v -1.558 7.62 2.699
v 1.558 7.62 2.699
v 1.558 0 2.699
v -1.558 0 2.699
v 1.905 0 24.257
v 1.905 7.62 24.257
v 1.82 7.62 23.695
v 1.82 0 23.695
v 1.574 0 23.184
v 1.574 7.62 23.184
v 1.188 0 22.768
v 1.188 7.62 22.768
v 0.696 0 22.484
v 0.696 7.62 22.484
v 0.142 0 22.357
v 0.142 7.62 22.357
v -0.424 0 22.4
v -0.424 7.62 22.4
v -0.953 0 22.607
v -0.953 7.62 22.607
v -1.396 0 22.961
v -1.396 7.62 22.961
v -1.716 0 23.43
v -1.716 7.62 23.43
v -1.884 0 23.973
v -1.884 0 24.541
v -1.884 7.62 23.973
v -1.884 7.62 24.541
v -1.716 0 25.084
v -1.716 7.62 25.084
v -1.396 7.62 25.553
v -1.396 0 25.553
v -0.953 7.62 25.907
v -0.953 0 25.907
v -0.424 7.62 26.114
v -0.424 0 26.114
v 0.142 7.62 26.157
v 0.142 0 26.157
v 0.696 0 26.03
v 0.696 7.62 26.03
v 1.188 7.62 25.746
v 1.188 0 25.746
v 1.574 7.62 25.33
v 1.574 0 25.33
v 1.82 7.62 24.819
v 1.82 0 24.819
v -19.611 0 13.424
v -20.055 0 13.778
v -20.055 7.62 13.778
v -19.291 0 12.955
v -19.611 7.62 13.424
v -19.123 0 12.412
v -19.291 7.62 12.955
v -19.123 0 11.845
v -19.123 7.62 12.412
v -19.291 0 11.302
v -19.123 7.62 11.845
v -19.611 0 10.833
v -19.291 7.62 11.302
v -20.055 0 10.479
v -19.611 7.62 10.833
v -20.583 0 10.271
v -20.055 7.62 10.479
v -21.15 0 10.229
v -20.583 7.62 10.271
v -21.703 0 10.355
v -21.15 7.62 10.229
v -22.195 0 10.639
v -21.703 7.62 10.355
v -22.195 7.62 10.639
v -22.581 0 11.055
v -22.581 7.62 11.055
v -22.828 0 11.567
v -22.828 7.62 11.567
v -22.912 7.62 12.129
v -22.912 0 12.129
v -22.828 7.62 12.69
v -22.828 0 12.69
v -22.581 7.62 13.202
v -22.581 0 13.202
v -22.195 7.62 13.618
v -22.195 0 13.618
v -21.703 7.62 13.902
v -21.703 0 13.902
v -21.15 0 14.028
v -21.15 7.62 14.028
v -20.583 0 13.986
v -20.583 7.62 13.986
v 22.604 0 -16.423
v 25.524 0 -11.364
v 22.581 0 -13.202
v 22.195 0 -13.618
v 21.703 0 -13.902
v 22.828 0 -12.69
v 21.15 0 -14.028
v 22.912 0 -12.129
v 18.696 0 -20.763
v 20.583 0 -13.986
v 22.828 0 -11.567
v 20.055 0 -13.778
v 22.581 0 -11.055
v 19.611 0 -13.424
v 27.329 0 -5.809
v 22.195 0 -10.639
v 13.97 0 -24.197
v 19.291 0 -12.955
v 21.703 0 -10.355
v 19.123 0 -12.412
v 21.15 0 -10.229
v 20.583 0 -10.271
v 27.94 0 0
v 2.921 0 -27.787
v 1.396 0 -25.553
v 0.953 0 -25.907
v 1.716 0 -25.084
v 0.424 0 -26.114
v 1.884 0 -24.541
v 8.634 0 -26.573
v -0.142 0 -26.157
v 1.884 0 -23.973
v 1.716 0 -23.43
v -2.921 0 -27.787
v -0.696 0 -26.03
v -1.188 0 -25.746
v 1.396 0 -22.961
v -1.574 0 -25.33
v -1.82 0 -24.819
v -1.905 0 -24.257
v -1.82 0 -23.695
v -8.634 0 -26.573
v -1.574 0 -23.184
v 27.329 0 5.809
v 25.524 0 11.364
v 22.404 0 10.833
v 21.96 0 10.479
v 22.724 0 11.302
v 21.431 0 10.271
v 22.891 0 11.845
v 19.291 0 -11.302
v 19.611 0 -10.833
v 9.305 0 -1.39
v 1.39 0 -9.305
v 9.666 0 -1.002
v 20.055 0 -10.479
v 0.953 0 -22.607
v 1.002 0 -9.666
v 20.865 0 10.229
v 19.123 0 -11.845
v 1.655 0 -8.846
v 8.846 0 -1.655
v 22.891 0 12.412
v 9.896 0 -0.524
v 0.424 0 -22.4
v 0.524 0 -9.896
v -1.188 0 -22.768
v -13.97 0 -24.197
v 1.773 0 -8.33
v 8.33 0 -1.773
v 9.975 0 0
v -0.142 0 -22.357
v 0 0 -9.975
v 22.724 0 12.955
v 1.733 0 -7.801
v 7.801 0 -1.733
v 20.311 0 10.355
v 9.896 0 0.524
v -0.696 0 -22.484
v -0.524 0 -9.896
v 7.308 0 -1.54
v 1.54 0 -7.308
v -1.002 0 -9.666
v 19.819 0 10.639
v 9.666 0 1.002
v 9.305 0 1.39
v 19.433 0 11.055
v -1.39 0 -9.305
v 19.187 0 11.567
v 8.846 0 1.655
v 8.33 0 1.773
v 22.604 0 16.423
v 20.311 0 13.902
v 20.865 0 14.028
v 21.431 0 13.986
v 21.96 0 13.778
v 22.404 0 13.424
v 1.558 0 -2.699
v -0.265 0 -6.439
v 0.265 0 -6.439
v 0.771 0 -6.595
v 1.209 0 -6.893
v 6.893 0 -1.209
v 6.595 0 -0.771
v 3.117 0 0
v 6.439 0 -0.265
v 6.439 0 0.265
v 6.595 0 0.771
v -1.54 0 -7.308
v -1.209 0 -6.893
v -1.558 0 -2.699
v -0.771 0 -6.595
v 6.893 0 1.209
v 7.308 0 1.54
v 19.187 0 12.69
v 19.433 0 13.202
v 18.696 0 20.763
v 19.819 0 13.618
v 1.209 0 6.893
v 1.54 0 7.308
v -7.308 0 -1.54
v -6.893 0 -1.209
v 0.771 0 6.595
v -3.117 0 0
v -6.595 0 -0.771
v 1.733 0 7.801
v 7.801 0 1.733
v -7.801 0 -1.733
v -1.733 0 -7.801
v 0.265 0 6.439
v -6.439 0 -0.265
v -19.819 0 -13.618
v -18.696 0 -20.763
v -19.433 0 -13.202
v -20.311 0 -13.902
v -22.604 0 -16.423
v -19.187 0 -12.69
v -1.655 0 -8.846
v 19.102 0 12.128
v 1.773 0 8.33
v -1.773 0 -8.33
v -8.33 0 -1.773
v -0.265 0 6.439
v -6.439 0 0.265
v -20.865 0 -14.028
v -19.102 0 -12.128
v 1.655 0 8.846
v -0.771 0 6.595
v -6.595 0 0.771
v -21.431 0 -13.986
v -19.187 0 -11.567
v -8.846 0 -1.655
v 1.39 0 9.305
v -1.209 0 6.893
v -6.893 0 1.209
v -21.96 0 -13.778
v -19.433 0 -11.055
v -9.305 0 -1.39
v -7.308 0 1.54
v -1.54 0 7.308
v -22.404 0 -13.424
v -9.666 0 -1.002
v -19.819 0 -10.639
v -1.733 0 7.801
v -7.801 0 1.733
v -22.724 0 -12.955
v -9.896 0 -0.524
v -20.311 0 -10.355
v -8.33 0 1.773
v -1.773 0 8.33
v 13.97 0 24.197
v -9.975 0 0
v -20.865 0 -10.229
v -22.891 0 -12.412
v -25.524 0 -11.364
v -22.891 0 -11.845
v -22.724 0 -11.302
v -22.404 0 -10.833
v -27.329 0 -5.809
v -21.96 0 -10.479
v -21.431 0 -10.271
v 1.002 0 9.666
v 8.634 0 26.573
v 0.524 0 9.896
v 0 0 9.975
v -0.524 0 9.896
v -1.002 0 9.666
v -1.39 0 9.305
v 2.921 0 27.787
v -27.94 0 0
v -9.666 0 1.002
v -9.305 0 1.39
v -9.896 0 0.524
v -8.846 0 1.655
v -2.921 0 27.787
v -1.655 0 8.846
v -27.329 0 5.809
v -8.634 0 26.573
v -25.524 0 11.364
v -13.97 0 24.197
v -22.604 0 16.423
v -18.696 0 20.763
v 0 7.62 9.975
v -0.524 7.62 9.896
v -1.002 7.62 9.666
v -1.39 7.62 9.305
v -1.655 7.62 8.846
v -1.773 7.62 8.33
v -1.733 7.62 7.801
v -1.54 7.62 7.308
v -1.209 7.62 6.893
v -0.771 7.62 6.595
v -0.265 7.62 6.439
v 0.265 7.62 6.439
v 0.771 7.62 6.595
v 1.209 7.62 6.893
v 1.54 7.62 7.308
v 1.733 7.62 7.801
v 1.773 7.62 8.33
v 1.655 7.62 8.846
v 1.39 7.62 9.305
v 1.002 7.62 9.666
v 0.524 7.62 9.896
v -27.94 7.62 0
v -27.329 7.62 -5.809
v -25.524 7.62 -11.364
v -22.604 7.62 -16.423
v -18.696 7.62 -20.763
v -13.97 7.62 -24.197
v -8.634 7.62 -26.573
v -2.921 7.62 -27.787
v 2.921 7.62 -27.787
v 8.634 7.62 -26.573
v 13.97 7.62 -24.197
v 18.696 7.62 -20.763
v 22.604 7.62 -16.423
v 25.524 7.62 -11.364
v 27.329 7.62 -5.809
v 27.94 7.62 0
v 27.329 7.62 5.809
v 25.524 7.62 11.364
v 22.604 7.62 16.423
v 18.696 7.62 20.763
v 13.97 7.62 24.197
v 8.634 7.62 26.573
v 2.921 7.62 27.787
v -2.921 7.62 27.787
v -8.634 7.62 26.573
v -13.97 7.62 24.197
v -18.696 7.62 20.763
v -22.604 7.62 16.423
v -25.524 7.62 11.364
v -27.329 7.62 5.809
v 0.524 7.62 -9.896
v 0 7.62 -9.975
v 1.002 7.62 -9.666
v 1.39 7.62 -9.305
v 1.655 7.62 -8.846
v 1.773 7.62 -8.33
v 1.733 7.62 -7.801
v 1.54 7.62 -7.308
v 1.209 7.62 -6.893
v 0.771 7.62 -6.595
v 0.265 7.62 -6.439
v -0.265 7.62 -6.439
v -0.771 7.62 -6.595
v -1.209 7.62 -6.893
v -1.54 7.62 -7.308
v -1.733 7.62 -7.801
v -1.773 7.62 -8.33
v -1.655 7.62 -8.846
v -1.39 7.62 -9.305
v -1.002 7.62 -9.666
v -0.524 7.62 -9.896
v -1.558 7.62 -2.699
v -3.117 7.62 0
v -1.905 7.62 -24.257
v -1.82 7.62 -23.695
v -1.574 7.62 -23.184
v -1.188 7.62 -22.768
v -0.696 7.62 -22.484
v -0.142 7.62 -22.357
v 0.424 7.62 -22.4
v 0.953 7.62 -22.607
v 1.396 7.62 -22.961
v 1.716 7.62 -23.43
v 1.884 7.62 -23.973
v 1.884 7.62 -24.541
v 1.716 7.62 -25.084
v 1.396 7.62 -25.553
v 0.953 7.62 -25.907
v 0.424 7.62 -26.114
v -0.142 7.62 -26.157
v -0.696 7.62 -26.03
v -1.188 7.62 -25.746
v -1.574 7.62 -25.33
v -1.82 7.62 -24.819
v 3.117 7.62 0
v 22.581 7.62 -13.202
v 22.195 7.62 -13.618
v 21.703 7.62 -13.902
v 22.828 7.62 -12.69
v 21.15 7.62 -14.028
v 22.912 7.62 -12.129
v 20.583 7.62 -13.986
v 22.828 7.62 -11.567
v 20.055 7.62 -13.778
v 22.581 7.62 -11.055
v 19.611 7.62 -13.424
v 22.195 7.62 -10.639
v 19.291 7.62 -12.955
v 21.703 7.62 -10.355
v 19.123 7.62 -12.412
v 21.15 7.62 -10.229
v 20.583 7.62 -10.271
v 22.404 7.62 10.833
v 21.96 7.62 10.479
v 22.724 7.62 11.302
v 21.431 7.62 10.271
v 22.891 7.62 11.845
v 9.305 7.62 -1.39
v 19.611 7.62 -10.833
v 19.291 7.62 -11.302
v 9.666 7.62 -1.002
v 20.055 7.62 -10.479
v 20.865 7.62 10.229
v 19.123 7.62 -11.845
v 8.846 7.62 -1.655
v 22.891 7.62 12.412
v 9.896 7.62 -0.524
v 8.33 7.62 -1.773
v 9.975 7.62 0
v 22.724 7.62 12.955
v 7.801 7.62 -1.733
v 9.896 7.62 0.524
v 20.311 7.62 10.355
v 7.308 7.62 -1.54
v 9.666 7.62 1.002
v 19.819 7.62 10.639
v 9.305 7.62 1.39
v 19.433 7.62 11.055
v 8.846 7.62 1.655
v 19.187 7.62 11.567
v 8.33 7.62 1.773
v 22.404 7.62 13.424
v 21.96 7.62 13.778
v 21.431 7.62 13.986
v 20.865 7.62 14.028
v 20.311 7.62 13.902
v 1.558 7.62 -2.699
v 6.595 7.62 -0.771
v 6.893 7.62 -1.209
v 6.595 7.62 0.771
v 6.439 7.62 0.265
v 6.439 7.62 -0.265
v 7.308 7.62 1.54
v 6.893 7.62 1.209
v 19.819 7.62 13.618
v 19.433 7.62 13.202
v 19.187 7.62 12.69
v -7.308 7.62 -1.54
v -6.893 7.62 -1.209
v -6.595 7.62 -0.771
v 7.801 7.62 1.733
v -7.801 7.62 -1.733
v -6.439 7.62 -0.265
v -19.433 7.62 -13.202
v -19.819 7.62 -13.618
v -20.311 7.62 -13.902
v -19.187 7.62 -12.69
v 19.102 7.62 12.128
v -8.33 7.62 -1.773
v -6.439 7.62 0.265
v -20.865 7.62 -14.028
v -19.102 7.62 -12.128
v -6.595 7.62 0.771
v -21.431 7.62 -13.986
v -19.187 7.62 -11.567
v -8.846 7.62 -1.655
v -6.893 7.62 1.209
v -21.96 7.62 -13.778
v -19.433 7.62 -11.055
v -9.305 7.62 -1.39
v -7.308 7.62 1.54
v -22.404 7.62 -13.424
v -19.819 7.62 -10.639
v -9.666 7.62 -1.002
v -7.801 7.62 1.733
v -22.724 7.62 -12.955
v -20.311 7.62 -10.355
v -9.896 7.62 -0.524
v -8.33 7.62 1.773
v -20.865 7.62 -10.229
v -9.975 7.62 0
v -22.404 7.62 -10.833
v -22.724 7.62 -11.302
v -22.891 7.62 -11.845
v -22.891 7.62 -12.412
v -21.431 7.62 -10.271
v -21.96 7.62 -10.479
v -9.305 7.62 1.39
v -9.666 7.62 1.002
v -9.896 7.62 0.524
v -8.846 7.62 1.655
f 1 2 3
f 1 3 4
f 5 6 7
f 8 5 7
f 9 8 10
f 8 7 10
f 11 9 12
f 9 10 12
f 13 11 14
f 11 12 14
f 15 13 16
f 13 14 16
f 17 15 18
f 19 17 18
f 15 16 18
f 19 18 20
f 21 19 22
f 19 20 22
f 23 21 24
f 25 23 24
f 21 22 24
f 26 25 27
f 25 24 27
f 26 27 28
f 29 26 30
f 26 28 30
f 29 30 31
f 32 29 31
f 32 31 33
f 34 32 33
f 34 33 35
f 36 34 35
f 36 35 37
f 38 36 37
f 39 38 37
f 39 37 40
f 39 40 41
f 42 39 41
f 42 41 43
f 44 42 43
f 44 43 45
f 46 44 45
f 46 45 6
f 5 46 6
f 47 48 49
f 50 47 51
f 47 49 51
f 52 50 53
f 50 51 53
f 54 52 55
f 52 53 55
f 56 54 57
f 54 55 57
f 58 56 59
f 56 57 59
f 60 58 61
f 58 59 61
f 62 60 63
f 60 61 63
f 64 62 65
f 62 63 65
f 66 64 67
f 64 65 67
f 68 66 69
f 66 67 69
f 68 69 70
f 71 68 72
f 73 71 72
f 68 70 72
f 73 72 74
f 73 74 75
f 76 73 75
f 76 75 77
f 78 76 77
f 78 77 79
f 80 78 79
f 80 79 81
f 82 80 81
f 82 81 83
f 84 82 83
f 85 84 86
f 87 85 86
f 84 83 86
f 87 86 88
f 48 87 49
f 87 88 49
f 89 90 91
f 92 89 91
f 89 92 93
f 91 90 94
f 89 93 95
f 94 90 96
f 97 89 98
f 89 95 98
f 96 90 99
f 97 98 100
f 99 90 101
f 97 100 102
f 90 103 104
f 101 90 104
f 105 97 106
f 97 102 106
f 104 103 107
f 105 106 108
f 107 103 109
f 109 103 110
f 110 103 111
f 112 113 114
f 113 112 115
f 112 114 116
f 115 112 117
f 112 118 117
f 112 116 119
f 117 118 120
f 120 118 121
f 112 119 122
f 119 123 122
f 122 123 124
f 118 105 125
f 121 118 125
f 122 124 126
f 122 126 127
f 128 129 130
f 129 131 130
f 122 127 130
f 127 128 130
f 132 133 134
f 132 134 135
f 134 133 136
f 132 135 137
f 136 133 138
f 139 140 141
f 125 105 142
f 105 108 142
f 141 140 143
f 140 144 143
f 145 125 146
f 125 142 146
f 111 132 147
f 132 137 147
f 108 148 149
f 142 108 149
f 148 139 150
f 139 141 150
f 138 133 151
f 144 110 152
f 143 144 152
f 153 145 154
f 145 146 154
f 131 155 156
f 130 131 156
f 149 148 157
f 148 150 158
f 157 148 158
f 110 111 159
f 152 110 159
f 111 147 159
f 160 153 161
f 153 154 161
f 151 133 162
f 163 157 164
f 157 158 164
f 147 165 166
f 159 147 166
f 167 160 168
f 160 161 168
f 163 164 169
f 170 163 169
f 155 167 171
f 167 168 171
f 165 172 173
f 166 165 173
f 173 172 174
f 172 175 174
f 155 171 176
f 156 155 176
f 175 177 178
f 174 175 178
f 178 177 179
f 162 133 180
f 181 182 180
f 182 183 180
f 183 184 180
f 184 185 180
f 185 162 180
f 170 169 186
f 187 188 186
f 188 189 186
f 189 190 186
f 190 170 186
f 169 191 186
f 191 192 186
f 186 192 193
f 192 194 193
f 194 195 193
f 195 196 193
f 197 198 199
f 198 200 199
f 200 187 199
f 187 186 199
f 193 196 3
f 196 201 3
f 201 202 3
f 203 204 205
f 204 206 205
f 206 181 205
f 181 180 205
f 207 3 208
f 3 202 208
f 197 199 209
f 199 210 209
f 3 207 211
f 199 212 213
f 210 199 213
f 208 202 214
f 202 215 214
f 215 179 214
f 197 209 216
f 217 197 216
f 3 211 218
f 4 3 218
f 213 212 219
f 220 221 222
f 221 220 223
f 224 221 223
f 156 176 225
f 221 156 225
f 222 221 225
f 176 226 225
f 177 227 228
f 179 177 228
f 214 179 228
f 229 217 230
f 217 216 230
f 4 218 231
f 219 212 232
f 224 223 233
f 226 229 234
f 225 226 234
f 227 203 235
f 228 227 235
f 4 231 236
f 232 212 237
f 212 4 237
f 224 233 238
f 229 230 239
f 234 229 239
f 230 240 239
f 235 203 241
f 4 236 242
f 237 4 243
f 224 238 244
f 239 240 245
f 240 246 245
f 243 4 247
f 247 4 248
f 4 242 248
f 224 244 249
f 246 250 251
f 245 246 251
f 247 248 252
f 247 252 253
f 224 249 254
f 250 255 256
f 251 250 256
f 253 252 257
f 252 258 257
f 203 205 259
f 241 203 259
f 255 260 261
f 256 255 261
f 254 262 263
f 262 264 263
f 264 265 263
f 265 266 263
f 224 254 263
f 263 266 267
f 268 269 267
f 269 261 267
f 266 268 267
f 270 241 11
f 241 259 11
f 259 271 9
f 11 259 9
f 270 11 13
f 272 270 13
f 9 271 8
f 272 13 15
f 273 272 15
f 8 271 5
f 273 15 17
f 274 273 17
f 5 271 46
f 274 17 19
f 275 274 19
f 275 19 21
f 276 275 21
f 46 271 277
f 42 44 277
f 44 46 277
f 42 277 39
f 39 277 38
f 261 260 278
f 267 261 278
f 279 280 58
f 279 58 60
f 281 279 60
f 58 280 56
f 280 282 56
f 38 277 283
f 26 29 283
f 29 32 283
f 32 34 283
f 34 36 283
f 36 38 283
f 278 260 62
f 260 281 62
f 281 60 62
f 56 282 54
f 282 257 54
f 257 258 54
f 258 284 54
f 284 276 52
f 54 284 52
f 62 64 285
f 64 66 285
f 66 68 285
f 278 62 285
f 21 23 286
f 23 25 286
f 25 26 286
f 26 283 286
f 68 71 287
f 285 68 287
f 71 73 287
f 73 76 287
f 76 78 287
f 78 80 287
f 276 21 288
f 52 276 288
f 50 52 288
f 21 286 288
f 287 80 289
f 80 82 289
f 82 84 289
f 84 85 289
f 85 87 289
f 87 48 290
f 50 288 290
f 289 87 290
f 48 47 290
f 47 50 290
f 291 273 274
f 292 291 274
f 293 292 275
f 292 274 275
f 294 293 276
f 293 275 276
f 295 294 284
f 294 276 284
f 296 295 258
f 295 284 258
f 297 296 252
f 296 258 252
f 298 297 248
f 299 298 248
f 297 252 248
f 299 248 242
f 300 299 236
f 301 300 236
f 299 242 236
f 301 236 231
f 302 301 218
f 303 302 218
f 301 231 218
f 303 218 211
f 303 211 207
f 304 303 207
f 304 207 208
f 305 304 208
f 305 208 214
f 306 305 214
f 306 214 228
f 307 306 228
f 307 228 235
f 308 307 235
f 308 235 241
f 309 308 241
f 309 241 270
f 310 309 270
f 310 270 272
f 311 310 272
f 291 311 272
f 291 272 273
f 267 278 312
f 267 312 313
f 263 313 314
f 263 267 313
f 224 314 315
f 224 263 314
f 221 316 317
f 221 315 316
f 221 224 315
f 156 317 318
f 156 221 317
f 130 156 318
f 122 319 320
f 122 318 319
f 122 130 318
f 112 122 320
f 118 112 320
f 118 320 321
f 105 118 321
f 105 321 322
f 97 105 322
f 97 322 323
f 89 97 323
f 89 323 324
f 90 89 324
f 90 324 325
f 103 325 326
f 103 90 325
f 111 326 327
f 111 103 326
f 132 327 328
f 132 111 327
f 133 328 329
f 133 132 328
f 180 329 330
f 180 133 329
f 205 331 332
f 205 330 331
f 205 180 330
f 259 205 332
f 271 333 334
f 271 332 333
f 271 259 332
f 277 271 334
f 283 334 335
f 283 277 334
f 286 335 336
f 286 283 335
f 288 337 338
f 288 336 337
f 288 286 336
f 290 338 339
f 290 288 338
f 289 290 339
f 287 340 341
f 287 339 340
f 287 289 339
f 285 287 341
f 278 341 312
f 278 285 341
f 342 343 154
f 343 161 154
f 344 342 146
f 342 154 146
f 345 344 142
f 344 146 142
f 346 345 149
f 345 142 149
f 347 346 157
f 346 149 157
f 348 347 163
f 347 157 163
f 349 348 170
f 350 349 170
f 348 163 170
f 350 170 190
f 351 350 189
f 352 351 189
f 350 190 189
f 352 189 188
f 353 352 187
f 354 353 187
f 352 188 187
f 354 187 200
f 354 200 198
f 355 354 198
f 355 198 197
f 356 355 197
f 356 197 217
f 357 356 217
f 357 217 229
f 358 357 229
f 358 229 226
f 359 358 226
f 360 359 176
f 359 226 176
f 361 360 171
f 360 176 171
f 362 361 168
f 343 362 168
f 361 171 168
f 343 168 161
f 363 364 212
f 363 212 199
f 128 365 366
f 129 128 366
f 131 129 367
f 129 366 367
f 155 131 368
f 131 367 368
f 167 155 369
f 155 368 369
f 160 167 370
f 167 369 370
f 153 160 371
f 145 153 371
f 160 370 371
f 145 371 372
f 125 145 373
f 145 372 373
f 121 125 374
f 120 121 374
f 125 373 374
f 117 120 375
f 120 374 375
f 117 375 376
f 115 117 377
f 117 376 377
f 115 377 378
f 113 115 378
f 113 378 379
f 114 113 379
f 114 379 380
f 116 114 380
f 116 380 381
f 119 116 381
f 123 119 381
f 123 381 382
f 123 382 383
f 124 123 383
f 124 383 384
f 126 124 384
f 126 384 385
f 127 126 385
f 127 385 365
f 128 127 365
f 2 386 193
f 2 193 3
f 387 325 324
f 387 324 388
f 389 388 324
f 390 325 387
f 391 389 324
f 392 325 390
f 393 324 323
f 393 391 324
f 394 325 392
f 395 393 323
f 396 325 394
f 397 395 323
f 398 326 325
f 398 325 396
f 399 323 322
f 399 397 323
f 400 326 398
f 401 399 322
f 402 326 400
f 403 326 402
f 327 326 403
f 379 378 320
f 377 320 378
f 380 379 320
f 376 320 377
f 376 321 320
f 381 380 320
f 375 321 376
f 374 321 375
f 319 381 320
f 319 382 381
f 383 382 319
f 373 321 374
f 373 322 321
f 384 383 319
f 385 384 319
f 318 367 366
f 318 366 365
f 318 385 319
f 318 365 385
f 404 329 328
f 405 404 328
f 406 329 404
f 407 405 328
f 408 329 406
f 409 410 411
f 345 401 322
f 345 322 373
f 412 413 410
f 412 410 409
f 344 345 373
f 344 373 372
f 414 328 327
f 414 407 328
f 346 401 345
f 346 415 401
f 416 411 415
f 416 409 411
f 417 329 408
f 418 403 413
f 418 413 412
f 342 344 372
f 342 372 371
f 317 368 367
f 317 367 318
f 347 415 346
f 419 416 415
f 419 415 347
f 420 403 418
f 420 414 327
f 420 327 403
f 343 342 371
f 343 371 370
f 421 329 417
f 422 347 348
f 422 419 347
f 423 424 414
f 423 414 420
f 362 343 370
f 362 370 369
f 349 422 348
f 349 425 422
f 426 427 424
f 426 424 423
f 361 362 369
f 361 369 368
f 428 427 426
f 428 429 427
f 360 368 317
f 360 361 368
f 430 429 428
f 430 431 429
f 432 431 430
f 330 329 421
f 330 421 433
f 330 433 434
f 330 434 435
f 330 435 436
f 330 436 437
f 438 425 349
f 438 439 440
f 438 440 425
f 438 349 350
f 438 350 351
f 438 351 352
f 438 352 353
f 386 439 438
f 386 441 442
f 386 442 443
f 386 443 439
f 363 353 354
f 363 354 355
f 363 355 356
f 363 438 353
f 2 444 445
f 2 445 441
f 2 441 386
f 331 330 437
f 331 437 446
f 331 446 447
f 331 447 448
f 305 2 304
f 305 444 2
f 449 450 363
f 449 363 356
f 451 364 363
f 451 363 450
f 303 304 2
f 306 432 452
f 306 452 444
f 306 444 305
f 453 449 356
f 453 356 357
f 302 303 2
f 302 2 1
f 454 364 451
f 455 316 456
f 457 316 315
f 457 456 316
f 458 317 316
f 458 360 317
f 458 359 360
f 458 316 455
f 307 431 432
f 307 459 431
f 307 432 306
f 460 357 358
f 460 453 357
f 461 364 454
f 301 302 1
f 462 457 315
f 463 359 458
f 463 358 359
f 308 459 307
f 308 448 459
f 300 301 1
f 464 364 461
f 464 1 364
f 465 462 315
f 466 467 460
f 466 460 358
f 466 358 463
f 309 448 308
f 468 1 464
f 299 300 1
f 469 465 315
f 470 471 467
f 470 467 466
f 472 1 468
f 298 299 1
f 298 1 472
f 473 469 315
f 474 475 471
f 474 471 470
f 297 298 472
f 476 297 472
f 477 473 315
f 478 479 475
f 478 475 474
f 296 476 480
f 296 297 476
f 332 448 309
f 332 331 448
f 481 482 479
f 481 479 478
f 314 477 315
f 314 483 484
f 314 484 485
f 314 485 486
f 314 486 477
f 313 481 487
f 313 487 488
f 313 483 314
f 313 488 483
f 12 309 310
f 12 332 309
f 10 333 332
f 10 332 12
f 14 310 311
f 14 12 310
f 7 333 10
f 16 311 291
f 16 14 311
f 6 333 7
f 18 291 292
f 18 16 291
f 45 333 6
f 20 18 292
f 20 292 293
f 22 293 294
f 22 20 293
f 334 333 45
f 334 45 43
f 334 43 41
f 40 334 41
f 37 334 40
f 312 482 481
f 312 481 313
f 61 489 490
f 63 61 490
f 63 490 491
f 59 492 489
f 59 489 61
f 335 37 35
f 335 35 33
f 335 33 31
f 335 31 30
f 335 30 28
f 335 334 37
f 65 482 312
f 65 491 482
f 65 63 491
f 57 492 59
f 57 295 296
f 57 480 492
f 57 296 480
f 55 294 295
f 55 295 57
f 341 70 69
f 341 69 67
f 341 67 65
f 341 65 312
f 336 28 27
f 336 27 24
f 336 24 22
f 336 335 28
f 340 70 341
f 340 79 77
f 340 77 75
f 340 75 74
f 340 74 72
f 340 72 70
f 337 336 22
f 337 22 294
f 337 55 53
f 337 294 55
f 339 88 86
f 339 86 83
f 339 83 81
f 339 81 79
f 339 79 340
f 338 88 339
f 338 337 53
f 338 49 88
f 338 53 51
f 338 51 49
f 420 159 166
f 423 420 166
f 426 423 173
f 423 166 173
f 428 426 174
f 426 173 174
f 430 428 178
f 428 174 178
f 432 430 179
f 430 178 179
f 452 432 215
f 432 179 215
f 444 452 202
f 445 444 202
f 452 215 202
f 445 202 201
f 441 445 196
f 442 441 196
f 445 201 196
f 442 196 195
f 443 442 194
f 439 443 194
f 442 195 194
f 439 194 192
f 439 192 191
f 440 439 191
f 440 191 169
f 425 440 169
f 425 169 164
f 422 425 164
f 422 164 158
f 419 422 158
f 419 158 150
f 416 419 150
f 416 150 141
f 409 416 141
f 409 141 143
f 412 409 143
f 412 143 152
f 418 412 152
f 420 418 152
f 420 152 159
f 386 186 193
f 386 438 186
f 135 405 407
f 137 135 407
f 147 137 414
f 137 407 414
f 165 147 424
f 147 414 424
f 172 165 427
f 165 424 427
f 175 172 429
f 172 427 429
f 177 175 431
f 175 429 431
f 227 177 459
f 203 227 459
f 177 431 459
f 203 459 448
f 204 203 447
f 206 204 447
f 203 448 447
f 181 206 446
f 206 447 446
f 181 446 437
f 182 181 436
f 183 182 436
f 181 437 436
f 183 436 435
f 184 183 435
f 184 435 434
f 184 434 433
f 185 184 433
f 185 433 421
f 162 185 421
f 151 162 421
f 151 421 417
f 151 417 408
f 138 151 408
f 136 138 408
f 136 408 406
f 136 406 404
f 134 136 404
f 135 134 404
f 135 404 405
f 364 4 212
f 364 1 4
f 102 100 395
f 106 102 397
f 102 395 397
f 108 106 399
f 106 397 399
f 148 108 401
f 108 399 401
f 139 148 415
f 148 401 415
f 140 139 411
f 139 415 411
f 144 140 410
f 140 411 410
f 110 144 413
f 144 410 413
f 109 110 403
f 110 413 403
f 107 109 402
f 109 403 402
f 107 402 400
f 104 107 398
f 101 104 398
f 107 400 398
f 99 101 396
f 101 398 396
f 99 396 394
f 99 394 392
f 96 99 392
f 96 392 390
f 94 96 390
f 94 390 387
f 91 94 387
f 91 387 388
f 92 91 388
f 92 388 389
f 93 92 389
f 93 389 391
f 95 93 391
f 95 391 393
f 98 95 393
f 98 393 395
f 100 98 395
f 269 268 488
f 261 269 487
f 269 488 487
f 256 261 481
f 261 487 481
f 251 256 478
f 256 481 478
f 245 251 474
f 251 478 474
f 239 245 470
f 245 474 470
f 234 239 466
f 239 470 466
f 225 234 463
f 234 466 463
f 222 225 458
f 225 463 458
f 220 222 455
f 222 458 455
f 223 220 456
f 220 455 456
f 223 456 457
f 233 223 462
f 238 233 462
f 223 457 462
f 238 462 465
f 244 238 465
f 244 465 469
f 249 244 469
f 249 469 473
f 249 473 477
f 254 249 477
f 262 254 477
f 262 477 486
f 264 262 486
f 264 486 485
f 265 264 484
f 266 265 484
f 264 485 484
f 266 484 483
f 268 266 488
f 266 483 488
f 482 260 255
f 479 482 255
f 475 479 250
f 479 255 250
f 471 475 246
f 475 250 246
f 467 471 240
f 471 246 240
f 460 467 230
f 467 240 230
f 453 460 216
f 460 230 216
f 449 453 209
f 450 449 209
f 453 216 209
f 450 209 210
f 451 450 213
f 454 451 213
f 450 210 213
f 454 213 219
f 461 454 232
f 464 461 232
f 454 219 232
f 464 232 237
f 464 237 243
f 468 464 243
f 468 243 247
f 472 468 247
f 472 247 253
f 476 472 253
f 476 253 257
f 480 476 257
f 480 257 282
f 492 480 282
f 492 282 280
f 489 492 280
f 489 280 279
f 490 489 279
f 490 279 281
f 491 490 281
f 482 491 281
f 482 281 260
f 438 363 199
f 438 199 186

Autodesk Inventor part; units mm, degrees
ref_plane "YZ Plane" through (0, 0, 0) normal (1, 0, 0) x (0, 1, 0)
ref_plane "XZ Plane" through (0, 0, 0) normal (0, 1, 0) x (-1, 0, 0)
ref_plane "XY Plane" through (0, 0, 0) normal (0, 0, 1) x (1, 0, 0)
sketch "Sketch1" plane through (0, 0, 0) normal (0, 1, 0) x (-1, 0, 0)
  circle A0 centre (0, 0) radius 27.94
  dimension "d0" = 55.88
extrude "Extrusion1" add sketch "Sketch1" along normal blind 7.62
ref_plane "Work Plane5" through (0, 21.082, 0) normal (0, 1, 0) x (1, 0, 0)
sketch "Sketch5" plane through (0, 21.082, 0) normal (0, 1, 0) x (1, 0, 0)
  line L0 (0, 0) -> (0, 2.667)
  line L1 (-3.1168, 0) -> (-1.5584, 2.6992)
  line L2 (-1.5584, 2.6992) -> (1.5584, 2.6992)
  line L3 (1.5584, 2.6992) -> (3.1168, 0)
  line L4 (3.1168, 0) -> (1.5584, -2.6992)
  line L5 (1.5584, -2.6992) -> (-1.5584, -2.6992)
  line L6 (-1.5584, -2.6992) -> (-3.1168, 0)
  dimension "d10" = 2.667
extrude "Extrusion4" cut sketch "Sketch5" against normal blind 25.4
sketch "Sketch6" plane through (0, 7.62, 0) normal (0, 1, 0) x (1, 0, 0)
  circle A0 centre (0, 0) radius 27.94 projected
  line L0 (0, -27.94) -> (0, -26.162)
  line L1 (0, -26.162) -> (0, -24.257)
  circle A1 centre (0, -24.257) radius 1.905
  dimension "d13" = 1.778
  dimension "d14" = 1.905
extrude "Extrusion5" cut sketch "Sketch6" against normal blind 25.4 contours A1
ref_plane "Work Plane6" through (0, 21.082, 0) normal (0, 1, 0) x (1, 0, 0)
pattern_circular "Circular Pattern1" count 6 over 360 about axis through (0, 21.082, 0) along (0, 1, 0) of "Extrusion5"
sketch "Sketch8" plane through (0, 0, 0) normal (0, -1, 0) x (1, 0, 0)
  line L0 (3.1168, 0) -> (1.5584, -2.6992) projected
  line L1 (3.1168, 0) -> (6.4188, 0)
  line L2 (6.4188, 0) -> (8.1968, 0)
  circle A0 centre (8.1968, 0) radius 1.778
  point P0 (0, 0)
  dimension "d20" = 3.302
  dimension "d21" = 1.778
extrude "Extrusion6" cut sketch "Sketch8" against normal blind 25.4
pattern_circular "Circular Pattern2" count 4 over 360 about axis through (0, 21.082, 0) along (0, 1, 0) of "Extrusion6"
properties part number "Wheel Mount"
